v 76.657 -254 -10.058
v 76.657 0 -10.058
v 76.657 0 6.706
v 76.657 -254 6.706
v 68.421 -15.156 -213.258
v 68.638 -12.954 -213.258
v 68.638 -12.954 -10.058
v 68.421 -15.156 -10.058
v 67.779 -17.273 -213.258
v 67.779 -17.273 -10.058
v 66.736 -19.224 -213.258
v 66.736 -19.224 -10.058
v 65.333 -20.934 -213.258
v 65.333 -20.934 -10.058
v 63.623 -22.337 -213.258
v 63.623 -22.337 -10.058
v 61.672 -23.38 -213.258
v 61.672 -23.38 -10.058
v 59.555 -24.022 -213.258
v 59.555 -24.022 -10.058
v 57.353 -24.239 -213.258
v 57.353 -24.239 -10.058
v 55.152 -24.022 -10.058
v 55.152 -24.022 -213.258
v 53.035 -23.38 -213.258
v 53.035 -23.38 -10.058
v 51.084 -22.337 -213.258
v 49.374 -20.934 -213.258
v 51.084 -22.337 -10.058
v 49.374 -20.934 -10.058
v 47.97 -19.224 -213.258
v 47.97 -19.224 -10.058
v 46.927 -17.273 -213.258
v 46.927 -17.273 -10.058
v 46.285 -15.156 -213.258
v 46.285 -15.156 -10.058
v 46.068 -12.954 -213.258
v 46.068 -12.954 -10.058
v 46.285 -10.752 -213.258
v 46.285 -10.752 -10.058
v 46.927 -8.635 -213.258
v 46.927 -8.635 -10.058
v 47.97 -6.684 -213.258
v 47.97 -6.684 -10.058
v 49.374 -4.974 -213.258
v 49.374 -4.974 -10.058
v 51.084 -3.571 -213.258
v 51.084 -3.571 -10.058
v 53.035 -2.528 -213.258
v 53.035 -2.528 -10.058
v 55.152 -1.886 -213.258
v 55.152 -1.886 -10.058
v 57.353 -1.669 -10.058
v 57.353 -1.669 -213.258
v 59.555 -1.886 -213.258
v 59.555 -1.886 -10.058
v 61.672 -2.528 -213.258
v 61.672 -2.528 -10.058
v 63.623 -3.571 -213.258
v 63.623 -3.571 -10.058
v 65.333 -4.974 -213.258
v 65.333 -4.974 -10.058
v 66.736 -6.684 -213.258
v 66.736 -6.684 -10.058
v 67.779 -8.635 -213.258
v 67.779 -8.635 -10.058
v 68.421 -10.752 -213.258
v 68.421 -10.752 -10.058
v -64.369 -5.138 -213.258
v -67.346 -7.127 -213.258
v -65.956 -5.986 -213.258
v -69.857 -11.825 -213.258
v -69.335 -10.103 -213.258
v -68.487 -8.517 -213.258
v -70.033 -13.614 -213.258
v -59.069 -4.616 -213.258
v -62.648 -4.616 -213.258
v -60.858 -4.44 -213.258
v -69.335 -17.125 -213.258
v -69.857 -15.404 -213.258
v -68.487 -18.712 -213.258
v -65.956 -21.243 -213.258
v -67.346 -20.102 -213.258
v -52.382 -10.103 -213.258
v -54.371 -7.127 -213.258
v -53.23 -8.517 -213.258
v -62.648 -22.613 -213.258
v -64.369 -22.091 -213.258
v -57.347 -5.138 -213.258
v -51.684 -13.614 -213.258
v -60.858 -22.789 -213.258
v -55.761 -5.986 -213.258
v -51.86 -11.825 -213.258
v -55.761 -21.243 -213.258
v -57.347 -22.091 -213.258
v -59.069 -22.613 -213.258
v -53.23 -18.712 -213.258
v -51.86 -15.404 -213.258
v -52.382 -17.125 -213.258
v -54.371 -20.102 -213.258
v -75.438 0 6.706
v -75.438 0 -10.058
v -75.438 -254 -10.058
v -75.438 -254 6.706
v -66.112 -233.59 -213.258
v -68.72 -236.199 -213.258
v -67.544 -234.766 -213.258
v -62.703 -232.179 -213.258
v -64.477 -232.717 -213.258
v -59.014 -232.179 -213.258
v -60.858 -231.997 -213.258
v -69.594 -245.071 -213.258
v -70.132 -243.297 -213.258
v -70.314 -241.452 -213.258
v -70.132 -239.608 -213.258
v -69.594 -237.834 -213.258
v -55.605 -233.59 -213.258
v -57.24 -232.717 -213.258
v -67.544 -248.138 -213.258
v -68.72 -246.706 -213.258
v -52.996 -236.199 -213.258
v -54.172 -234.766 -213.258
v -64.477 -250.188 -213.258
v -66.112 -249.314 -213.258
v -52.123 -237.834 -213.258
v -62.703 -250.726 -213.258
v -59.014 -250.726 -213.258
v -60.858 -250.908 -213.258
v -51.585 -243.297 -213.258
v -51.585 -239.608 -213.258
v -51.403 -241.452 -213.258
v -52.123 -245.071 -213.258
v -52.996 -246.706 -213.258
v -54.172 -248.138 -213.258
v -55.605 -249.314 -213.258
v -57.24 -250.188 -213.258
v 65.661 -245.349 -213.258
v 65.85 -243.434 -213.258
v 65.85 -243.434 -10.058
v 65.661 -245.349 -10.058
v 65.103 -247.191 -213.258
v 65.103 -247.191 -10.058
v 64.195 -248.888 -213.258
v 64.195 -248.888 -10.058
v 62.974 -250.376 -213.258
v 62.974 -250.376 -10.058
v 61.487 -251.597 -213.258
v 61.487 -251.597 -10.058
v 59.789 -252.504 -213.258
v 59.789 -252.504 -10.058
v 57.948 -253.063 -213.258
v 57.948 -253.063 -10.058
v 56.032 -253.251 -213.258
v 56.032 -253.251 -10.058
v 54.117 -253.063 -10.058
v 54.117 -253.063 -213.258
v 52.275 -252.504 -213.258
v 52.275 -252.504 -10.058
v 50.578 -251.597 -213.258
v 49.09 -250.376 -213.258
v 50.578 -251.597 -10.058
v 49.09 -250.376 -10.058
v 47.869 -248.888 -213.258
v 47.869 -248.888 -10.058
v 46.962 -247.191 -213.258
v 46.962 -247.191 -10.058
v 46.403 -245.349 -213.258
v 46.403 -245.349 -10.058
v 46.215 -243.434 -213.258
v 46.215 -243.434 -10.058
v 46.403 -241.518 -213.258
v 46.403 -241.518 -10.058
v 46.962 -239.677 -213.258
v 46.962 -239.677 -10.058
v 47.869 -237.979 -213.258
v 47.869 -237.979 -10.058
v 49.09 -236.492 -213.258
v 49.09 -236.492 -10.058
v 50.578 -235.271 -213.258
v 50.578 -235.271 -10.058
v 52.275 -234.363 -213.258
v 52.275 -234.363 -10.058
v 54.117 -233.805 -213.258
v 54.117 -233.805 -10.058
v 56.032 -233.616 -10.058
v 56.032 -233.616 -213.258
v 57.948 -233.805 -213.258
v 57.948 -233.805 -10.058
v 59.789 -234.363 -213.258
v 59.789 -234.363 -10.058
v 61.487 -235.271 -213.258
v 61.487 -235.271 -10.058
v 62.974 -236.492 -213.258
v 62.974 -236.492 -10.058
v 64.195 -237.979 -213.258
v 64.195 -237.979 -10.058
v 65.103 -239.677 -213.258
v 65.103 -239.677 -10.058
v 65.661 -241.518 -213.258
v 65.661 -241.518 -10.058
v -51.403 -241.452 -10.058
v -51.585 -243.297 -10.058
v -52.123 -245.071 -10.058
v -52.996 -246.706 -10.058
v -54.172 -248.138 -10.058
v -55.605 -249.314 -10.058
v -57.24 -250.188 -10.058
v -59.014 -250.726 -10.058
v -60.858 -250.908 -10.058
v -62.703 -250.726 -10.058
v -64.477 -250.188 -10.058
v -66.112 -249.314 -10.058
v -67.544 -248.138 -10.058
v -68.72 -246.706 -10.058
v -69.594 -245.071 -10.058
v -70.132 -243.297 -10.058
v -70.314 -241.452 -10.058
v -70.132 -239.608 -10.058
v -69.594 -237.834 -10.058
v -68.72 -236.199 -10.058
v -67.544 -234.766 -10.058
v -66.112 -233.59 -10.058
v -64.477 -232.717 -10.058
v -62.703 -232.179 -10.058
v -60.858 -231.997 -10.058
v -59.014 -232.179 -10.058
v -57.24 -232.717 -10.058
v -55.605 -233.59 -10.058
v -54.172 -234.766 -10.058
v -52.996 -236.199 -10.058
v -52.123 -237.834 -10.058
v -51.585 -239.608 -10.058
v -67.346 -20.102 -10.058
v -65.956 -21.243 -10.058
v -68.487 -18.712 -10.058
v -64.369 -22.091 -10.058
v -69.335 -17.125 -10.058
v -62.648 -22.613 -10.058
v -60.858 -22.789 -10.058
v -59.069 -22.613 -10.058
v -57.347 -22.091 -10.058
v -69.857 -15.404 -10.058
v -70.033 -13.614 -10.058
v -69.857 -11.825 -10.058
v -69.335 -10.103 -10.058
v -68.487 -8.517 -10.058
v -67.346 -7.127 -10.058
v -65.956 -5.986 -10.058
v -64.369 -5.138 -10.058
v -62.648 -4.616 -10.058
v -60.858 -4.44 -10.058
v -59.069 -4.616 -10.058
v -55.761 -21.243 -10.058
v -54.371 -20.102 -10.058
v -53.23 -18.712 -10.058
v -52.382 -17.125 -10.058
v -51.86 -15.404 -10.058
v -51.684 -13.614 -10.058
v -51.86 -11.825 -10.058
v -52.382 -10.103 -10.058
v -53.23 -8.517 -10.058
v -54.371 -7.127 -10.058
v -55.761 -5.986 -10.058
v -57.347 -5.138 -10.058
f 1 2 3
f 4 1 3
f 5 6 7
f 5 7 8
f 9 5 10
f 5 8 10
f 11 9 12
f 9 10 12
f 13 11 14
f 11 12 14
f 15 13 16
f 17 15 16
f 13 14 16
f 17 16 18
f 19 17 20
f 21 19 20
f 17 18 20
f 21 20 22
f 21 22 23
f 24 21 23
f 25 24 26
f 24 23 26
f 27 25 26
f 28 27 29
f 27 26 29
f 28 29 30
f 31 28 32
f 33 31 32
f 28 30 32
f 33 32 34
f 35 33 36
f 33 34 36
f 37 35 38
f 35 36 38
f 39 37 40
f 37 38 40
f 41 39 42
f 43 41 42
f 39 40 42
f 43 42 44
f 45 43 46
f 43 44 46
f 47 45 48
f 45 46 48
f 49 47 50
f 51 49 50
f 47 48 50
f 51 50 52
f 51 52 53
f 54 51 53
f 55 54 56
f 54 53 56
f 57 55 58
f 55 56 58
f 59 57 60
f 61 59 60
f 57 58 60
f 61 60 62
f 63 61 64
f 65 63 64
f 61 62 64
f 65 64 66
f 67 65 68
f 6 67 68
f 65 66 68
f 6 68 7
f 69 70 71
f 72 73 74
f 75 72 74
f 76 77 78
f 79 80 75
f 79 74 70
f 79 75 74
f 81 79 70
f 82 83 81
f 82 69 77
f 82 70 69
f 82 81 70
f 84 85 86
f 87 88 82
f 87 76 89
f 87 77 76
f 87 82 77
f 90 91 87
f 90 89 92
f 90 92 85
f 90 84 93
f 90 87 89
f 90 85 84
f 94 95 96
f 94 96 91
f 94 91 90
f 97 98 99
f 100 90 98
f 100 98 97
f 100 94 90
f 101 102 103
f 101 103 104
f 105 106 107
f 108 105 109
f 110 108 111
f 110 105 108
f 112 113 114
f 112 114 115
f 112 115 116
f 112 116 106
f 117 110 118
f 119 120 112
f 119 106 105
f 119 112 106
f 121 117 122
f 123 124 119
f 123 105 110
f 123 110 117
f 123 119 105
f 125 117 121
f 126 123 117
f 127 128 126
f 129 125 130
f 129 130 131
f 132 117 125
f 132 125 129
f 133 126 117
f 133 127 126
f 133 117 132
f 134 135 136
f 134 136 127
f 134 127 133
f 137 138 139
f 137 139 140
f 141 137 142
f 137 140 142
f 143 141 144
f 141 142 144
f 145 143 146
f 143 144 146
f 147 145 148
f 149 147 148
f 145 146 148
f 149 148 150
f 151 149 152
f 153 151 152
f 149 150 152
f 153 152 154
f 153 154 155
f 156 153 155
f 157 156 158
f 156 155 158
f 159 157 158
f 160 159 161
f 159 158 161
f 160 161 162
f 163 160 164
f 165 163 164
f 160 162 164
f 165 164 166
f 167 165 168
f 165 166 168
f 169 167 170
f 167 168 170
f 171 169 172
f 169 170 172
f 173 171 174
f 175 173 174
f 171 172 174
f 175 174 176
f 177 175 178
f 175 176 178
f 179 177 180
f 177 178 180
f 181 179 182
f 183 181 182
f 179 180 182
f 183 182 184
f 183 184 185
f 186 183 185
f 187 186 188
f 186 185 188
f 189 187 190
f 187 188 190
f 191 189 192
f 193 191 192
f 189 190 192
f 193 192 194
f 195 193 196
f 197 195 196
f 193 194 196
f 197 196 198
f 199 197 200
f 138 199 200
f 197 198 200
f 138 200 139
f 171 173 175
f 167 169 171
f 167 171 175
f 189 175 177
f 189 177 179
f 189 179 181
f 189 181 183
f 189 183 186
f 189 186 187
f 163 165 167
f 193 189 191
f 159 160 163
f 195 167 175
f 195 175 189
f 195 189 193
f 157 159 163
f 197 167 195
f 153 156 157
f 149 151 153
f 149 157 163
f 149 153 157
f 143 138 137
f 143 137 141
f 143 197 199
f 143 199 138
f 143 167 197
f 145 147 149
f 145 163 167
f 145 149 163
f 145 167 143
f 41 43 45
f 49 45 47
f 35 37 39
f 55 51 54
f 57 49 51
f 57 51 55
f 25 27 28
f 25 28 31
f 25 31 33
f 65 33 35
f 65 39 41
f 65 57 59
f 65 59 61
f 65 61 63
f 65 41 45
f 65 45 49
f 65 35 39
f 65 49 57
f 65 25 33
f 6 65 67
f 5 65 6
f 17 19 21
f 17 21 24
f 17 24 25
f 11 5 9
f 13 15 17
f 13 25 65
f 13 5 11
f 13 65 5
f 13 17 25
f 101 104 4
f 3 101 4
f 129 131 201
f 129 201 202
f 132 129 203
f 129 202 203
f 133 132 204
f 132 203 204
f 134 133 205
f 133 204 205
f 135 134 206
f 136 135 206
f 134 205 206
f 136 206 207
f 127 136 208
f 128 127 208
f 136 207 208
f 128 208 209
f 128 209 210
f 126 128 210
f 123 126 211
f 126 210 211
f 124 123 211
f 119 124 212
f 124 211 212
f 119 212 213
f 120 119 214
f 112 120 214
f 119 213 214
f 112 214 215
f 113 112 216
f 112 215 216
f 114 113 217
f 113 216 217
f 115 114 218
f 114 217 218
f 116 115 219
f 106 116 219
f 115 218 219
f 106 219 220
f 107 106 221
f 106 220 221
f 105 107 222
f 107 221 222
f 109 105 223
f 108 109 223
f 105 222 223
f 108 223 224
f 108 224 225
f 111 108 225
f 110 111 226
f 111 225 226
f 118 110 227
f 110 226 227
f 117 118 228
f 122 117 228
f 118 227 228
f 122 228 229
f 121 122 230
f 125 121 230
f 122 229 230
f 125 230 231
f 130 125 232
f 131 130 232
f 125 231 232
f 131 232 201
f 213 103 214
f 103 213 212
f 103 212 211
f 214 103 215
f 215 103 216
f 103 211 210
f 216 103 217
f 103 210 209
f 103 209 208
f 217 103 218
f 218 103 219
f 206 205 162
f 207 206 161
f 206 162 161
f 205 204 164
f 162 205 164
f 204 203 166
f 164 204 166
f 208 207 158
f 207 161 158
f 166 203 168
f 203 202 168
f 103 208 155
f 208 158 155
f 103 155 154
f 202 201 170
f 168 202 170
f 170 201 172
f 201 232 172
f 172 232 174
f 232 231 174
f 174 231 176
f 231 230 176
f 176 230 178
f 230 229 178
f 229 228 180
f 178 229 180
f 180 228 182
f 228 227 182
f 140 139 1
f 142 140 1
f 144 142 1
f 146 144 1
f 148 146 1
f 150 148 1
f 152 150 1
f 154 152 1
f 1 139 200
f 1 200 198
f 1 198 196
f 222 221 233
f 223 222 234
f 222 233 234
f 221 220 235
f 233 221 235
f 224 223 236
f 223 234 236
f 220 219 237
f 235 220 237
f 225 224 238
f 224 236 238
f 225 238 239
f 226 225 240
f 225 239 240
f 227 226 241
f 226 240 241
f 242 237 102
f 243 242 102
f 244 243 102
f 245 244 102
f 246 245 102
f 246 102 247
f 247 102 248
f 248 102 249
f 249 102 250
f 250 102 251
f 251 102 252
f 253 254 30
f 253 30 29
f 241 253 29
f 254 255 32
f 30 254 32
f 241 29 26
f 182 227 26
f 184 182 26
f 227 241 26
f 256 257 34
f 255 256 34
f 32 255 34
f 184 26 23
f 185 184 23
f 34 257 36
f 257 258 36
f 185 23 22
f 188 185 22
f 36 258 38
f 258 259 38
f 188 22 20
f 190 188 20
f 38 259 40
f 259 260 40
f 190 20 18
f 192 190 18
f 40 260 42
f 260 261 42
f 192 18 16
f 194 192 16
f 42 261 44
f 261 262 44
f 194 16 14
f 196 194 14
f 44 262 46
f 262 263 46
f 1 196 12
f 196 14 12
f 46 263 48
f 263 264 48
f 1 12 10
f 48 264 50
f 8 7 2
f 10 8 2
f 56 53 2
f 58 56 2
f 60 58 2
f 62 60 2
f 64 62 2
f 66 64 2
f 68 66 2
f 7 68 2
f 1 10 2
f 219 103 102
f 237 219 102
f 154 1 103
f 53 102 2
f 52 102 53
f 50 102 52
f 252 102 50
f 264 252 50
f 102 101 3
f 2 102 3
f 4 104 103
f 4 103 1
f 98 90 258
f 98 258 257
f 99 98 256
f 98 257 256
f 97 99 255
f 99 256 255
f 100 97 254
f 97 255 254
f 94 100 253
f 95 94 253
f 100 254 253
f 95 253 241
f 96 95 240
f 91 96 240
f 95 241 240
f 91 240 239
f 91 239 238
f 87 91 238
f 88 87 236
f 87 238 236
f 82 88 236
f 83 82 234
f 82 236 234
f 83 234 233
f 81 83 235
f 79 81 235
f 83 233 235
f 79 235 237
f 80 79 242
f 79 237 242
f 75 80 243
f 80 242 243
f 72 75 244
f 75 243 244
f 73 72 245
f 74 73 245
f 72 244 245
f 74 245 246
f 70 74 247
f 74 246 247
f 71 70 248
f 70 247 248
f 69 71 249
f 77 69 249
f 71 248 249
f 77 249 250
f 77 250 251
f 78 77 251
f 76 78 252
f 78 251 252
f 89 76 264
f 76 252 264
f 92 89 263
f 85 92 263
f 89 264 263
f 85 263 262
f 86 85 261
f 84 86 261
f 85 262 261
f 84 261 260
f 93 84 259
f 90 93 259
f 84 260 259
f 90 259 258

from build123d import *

# Parameters (mm, degrees)
F0_W     = 152.095206
F0_H     = 16.764
F1_DEPTH = 254
F2_R     = 9.455493
F2_R_2   = 9.174566
F2_R_3   = 11.28492
F2_R_4   = 9.817554
F3_DEPTH = 203.2


with BuildPart() as f1:
    # F0 (on Front) → F1 (new body)
    with BuildSketch(Plane.XZ):
        with Locations((0.609603, -1.6764)):
            Rectangle(F0_W, F0_H)
    extrude(amount=F1_DEPTH)

    # F2 (on face) → F3 (join)
    with BuildSketch(Plane(origin=(0, 0, -10.0584), x_dir=(1, 0, 0), z_dir=(0, 0, -1))):
        with Locations((-60.858399, 241.452411)):
            Circle(F2_R)
        with Locations((-60.858399, 13.614404)):
            Circle(F2_R_2)
        with Locations((57.353202, 12.954001)):
            Circle(F2_R_3)
        with Locations((56.032401, 243.43361)):
            Circle(F2_R_4)
    extrude(amount=F3_DEPTH)


solid = f1.part
